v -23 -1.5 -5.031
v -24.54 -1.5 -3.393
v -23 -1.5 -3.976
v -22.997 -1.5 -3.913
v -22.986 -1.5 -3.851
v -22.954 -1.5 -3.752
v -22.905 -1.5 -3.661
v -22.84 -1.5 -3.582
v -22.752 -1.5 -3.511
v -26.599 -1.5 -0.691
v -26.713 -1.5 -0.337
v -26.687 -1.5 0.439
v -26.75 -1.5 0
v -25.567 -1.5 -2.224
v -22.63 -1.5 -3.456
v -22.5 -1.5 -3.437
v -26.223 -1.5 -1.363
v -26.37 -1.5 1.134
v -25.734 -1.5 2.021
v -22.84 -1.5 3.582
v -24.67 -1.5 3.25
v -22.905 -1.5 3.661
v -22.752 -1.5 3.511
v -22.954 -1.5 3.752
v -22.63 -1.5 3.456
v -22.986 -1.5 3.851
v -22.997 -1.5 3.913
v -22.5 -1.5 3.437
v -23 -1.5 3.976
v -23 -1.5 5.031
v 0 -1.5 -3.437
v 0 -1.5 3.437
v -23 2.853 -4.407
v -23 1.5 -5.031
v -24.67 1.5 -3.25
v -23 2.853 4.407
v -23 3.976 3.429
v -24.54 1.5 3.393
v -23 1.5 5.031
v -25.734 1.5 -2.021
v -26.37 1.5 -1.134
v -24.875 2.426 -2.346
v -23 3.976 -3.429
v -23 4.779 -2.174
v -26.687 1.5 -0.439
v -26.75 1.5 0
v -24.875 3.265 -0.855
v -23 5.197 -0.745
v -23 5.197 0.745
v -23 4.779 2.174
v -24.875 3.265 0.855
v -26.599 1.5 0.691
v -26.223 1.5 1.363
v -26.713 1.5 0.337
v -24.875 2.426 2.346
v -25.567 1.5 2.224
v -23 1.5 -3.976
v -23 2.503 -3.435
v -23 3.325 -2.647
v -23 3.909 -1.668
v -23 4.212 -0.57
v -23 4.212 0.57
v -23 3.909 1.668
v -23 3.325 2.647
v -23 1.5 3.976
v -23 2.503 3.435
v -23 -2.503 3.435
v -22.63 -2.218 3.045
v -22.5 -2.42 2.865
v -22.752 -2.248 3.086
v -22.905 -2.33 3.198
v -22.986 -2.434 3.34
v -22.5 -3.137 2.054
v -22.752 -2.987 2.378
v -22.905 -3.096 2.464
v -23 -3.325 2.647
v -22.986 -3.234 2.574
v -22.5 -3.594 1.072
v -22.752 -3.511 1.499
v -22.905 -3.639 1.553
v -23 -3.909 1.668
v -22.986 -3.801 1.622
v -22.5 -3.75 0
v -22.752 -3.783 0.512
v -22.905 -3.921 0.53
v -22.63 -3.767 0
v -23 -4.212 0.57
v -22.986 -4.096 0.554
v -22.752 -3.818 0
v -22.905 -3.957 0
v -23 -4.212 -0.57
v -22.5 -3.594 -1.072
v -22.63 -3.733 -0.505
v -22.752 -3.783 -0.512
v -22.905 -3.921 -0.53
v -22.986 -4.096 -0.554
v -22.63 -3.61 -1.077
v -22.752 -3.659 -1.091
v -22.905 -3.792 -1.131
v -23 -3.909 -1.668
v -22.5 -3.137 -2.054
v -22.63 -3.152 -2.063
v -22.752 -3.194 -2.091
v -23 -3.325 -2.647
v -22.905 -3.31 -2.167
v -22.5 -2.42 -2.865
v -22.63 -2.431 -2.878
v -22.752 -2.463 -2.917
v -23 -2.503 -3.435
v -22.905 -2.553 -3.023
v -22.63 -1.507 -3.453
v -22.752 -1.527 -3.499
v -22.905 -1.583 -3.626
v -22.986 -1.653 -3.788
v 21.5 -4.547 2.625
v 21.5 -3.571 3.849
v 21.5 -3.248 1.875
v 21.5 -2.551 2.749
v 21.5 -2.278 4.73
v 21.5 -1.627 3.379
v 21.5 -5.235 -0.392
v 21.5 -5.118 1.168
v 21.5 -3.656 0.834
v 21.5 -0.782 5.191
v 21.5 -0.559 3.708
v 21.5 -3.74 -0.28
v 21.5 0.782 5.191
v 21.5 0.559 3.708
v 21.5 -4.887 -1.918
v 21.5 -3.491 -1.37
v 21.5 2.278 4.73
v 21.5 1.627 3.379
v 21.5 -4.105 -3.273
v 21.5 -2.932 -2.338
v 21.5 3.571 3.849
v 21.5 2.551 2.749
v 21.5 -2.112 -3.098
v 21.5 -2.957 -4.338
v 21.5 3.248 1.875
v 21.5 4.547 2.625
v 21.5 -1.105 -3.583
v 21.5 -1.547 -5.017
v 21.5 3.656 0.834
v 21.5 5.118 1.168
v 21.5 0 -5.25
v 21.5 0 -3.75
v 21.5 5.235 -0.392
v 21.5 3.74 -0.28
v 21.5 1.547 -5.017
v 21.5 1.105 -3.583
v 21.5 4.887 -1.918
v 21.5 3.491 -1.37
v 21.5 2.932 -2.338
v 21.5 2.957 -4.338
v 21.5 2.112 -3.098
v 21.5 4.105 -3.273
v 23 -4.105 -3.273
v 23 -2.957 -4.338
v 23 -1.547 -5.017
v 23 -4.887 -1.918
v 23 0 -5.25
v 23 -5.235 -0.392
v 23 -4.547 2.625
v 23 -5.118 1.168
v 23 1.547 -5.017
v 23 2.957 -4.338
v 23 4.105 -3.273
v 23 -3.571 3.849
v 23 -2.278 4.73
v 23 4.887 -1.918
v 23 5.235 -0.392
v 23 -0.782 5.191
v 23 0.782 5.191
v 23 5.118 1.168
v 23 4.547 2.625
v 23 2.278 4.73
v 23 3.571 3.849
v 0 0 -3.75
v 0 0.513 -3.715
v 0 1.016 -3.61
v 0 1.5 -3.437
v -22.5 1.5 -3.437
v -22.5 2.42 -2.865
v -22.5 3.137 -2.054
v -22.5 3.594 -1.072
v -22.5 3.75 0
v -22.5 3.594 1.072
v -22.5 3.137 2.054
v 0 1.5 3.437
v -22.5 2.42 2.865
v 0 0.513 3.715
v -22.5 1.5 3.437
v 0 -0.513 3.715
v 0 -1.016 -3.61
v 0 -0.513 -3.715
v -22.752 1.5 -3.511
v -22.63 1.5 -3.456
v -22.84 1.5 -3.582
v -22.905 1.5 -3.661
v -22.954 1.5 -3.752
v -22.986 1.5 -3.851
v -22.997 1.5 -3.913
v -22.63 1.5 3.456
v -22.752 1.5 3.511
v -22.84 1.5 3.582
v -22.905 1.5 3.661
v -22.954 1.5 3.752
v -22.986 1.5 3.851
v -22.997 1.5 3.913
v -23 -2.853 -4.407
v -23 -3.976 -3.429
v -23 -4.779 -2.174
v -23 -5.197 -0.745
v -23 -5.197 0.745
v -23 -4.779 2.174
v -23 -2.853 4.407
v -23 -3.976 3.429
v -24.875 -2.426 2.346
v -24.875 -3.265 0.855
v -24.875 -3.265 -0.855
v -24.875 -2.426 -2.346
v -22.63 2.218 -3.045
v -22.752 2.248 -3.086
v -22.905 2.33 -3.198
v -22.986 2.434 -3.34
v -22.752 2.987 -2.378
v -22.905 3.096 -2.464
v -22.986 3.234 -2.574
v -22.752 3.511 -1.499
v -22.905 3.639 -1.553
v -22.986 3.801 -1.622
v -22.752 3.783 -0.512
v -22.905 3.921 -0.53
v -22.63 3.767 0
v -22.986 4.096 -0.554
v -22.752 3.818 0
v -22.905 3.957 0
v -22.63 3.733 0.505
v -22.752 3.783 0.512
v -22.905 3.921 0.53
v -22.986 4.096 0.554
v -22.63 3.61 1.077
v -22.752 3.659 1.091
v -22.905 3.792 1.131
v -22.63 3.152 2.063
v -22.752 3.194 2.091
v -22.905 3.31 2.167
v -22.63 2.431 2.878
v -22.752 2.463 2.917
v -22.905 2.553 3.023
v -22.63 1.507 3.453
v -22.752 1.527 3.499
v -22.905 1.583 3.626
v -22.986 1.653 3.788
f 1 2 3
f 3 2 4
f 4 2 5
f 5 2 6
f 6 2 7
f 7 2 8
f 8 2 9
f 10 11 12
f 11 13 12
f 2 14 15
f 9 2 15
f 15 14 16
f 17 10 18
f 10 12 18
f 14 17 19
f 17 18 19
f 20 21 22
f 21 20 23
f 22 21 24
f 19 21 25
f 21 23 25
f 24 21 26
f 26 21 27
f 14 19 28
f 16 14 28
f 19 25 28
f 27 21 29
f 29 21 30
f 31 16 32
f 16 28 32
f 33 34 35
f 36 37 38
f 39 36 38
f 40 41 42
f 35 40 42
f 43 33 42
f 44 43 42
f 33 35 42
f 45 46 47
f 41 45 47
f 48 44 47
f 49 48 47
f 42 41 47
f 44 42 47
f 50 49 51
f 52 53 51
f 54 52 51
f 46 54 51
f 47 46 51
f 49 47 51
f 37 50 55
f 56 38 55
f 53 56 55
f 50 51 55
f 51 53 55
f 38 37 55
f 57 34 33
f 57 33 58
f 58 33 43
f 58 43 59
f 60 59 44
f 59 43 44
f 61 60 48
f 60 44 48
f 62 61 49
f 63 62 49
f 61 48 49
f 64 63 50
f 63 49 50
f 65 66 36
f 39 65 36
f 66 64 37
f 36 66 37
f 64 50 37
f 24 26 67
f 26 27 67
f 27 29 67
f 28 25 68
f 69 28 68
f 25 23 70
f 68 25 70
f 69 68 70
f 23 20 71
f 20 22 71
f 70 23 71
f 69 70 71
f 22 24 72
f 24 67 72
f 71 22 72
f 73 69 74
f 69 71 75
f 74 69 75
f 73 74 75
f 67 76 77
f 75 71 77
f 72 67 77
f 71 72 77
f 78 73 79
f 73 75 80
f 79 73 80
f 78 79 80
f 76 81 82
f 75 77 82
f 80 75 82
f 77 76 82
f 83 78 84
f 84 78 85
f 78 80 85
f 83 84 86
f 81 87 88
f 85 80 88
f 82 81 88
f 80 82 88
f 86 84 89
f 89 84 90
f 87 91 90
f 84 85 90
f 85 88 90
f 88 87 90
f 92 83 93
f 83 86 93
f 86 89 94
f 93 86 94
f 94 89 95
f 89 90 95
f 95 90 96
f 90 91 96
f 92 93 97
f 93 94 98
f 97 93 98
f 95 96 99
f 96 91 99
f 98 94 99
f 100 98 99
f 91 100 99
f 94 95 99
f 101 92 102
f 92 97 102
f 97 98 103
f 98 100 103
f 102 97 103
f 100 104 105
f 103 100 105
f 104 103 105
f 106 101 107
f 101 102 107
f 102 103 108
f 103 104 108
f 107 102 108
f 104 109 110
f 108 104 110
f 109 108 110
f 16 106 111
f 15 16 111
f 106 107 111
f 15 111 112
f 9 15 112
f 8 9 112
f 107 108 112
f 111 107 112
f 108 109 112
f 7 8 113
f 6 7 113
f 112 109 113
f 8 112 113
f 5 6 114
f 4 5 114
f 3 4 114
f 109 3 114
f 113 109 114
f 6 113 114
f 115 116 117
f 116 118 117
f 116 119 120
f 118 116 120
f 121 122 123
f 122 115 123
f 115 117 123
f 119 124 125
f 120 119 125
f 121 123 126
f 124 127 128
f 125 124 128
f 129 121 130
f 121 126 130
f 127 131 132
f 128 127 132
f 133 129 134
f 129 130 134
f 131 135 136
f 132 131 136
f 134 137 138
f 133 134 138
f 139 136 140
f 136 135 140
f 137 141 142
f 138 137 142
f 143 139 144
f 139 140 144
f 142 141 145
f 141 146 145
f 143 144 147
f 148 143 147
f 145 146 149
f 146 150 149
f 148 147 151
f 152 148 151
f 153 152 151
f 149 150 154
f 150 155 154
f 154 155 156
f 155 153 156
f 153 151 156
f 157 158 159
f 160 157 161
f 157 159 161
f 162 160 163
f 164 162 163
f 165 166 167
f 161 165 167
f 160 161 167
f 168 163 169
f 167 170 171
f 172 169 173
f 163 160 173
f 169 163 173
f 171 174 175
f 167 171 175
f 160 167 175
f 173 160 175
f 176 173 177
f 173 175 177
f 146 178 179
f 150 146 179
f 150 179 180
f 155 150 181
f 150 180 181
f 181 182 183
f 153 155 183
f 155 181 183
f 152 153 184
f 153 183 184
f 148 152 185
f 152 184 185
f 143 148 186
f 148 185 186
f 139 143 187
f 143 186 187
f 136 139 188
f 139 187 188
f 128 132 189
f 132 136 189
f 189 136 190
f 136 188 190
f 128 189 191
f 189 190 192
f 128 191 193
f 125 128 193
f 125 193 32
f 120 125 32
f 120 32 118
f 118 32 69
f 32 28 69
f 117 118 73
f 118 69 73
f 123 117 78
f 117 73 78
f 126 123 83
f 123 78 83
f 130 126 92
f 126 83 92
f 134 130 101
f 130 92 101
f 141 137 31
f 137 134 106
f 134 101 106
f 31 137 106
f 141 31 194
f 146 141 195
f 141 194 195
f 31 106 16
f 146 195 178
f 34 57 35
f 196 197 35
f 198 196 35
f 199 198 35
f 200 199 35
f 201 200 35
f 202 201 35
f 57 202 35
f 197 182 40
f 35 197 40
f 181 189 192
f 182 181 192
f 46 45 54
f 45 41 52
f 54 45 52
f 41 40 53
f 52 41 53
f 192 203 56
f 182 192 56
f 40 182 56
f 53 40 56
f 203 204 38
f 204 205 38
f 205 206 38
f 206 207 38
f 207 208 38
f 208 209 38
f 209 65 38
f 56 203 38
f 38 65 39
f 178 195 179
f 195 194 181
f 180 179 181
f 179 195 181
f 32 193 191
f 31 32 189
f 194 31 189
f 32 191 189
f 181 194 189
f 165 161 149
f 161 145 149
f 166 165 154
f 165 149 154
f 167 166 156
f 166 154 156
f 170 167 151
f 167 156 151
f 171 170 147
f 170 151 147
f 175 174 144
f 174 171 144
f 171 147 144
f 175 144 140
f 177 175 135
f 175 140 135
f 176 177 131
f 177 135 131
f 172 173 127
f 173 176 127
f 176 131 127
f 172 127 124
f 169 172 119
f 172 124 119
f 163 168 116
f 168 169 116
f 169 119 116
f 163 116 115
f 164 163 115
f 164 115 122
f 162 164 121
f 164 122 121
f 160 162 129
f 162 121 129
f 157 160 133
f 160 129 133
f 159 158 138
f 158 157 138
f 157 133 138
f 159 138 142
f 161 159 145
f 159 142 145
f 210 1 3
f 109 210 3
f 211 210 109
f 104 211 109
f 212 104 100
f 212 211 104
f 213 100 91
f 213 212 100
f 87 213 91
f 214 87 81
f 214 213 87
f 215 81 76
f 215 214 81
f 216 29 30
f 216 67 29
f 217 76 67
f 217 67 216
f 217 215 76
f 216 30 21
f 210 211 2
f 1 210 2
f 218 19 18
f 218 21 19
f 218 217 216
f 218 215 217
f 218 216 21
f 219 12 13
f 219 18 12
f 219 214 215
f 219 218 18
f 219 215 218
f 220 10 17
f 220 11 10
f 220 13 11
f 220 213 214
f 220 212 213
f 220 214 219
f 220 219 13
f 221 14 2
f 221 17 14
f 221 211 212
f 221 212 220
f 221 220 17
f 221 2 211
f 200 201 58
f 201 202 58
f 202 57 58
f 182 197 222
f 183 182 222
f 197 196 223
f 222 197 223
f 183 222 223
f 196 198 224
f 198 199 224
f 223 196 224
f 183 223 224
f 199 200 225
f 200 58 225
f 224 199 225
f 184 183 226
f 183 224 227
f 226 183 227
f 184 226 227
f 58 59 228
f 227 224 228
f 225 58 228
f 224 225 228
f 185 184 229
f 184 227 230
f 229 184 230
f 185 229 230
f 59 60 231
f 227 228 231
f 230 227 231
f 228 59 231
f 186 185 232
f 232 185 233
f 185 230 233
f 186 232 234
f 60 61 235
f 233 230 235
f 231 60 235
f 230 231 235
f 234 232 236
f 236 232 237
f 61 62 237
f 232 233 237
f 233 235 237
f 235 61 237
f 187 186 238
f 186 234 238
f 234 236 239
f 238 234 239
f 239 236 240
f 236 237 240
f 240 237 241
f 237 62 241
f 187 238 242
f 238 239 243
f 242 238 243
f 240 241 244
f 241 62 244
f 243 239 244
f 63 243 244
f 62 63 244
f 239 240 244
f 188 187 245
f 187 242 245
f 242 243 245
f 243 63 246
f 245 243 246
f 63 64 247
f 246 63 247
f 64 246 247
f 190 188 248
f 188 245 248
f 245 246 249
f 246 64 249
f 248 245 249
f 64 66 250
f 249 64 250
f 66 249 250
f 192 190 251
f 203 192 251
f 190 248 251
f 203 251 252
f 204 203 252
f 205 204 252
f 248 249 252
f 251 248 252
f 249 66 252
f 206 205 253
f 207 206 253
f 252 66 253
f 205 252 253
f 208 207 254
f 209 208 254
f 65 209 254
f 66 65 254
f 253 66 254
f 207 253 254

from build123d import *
from build123d import SkipClean  # not in build123d's __all__

# Parameters (mm, degrees)
F1_ANGLE_BACK = 90
F1_ANGLE      = 180
F2_ANGLE_BACK = 90
F2_ANGLE      = 180
F3_DEPTH      = 5.5
F4_R          = 0.5


with BuildPart() as f1:
    # F0 (on Top) → F1 (revolve)
    with BuildSketch(Plane.XY, mode=Mode.PRIVATE) as f1_sk:
        Polygon((23, 0), (0, 0), (0, -1.5), (0, -3.75), (21.5, -3.75), (21.5, -5.25), (23, -5.25), (23, -3.75), (23, -1.5), align=None)
        Polygon((0, -3.75), (0, -1.5), (-11.5, -1.5), (-23, -1.5), (-26.75, -1.5), (-23, -5.25), (-23, -3.75), align=None)
    revolve(f1_sk.sketch.rotate(Axis((11.5, 0, 0), (1, 0, 0)), -F1_ANGLE_BACK), axis=Axis((11.5, 0, 0), (1, 0, 0)), revolution_arc=F1_ANGLE)

    # F0 (on Top) → F2 (revolve)
    with BuildSketch(Plane.XY, mode=Mode.PRIVATE) as f2_sk:
        Polygon((21.5, 5.25), (21.5, 3.75), (11.5, 3.75), (0, 3.75), (0, 1.5), (0, 0), (23, 0), (23, 1.5), (23, 3.75), (23, 5.25), align=None)
        Polygon((0, 1.5), (0, 3.75), (-23, 3.75), (-23, 5.25), (-26.75, 1.5), (-23, 1.5), (-11.5, 1.5), align=None)
    revolve(f2_sk.sketch.rotate(Axis((11.5, 0, 0), (1, 0, 0)), -F2_ANGLE_BACK), axis=Axis((11.5, 0, 0), (1, 0, 0)), revolution_arc=F2_ANGLE)

    # F0 (on Top) → F3 (cut, symmetric)
    with BuildSketch(Plane.XY):
        Polygon((0, 0), (0, 1.5), (-11.5, 1.5), (-23, 1.5), (-26.75, 1.5), (-26.75, -1.5), (-23, -1.5), (-11.5, -1.5), (0, -1.5), align=None)
    with SkipClean():  # cleaning this boolean's faces spoils the solid; the shape is the same uncleaned
        extrude(amount=F3_DEPTH, both=True, mode=Mode.SUBTRACT)

    # F4
    f4_edges = [f1.edges().sort_by_distance(p)[0] for p in [
        (-23, 3.75, 0),
        (-23, -3.75, 0),
    ]]
    fillet(f4_edges, radius=F4_R)


solid = f1.part
